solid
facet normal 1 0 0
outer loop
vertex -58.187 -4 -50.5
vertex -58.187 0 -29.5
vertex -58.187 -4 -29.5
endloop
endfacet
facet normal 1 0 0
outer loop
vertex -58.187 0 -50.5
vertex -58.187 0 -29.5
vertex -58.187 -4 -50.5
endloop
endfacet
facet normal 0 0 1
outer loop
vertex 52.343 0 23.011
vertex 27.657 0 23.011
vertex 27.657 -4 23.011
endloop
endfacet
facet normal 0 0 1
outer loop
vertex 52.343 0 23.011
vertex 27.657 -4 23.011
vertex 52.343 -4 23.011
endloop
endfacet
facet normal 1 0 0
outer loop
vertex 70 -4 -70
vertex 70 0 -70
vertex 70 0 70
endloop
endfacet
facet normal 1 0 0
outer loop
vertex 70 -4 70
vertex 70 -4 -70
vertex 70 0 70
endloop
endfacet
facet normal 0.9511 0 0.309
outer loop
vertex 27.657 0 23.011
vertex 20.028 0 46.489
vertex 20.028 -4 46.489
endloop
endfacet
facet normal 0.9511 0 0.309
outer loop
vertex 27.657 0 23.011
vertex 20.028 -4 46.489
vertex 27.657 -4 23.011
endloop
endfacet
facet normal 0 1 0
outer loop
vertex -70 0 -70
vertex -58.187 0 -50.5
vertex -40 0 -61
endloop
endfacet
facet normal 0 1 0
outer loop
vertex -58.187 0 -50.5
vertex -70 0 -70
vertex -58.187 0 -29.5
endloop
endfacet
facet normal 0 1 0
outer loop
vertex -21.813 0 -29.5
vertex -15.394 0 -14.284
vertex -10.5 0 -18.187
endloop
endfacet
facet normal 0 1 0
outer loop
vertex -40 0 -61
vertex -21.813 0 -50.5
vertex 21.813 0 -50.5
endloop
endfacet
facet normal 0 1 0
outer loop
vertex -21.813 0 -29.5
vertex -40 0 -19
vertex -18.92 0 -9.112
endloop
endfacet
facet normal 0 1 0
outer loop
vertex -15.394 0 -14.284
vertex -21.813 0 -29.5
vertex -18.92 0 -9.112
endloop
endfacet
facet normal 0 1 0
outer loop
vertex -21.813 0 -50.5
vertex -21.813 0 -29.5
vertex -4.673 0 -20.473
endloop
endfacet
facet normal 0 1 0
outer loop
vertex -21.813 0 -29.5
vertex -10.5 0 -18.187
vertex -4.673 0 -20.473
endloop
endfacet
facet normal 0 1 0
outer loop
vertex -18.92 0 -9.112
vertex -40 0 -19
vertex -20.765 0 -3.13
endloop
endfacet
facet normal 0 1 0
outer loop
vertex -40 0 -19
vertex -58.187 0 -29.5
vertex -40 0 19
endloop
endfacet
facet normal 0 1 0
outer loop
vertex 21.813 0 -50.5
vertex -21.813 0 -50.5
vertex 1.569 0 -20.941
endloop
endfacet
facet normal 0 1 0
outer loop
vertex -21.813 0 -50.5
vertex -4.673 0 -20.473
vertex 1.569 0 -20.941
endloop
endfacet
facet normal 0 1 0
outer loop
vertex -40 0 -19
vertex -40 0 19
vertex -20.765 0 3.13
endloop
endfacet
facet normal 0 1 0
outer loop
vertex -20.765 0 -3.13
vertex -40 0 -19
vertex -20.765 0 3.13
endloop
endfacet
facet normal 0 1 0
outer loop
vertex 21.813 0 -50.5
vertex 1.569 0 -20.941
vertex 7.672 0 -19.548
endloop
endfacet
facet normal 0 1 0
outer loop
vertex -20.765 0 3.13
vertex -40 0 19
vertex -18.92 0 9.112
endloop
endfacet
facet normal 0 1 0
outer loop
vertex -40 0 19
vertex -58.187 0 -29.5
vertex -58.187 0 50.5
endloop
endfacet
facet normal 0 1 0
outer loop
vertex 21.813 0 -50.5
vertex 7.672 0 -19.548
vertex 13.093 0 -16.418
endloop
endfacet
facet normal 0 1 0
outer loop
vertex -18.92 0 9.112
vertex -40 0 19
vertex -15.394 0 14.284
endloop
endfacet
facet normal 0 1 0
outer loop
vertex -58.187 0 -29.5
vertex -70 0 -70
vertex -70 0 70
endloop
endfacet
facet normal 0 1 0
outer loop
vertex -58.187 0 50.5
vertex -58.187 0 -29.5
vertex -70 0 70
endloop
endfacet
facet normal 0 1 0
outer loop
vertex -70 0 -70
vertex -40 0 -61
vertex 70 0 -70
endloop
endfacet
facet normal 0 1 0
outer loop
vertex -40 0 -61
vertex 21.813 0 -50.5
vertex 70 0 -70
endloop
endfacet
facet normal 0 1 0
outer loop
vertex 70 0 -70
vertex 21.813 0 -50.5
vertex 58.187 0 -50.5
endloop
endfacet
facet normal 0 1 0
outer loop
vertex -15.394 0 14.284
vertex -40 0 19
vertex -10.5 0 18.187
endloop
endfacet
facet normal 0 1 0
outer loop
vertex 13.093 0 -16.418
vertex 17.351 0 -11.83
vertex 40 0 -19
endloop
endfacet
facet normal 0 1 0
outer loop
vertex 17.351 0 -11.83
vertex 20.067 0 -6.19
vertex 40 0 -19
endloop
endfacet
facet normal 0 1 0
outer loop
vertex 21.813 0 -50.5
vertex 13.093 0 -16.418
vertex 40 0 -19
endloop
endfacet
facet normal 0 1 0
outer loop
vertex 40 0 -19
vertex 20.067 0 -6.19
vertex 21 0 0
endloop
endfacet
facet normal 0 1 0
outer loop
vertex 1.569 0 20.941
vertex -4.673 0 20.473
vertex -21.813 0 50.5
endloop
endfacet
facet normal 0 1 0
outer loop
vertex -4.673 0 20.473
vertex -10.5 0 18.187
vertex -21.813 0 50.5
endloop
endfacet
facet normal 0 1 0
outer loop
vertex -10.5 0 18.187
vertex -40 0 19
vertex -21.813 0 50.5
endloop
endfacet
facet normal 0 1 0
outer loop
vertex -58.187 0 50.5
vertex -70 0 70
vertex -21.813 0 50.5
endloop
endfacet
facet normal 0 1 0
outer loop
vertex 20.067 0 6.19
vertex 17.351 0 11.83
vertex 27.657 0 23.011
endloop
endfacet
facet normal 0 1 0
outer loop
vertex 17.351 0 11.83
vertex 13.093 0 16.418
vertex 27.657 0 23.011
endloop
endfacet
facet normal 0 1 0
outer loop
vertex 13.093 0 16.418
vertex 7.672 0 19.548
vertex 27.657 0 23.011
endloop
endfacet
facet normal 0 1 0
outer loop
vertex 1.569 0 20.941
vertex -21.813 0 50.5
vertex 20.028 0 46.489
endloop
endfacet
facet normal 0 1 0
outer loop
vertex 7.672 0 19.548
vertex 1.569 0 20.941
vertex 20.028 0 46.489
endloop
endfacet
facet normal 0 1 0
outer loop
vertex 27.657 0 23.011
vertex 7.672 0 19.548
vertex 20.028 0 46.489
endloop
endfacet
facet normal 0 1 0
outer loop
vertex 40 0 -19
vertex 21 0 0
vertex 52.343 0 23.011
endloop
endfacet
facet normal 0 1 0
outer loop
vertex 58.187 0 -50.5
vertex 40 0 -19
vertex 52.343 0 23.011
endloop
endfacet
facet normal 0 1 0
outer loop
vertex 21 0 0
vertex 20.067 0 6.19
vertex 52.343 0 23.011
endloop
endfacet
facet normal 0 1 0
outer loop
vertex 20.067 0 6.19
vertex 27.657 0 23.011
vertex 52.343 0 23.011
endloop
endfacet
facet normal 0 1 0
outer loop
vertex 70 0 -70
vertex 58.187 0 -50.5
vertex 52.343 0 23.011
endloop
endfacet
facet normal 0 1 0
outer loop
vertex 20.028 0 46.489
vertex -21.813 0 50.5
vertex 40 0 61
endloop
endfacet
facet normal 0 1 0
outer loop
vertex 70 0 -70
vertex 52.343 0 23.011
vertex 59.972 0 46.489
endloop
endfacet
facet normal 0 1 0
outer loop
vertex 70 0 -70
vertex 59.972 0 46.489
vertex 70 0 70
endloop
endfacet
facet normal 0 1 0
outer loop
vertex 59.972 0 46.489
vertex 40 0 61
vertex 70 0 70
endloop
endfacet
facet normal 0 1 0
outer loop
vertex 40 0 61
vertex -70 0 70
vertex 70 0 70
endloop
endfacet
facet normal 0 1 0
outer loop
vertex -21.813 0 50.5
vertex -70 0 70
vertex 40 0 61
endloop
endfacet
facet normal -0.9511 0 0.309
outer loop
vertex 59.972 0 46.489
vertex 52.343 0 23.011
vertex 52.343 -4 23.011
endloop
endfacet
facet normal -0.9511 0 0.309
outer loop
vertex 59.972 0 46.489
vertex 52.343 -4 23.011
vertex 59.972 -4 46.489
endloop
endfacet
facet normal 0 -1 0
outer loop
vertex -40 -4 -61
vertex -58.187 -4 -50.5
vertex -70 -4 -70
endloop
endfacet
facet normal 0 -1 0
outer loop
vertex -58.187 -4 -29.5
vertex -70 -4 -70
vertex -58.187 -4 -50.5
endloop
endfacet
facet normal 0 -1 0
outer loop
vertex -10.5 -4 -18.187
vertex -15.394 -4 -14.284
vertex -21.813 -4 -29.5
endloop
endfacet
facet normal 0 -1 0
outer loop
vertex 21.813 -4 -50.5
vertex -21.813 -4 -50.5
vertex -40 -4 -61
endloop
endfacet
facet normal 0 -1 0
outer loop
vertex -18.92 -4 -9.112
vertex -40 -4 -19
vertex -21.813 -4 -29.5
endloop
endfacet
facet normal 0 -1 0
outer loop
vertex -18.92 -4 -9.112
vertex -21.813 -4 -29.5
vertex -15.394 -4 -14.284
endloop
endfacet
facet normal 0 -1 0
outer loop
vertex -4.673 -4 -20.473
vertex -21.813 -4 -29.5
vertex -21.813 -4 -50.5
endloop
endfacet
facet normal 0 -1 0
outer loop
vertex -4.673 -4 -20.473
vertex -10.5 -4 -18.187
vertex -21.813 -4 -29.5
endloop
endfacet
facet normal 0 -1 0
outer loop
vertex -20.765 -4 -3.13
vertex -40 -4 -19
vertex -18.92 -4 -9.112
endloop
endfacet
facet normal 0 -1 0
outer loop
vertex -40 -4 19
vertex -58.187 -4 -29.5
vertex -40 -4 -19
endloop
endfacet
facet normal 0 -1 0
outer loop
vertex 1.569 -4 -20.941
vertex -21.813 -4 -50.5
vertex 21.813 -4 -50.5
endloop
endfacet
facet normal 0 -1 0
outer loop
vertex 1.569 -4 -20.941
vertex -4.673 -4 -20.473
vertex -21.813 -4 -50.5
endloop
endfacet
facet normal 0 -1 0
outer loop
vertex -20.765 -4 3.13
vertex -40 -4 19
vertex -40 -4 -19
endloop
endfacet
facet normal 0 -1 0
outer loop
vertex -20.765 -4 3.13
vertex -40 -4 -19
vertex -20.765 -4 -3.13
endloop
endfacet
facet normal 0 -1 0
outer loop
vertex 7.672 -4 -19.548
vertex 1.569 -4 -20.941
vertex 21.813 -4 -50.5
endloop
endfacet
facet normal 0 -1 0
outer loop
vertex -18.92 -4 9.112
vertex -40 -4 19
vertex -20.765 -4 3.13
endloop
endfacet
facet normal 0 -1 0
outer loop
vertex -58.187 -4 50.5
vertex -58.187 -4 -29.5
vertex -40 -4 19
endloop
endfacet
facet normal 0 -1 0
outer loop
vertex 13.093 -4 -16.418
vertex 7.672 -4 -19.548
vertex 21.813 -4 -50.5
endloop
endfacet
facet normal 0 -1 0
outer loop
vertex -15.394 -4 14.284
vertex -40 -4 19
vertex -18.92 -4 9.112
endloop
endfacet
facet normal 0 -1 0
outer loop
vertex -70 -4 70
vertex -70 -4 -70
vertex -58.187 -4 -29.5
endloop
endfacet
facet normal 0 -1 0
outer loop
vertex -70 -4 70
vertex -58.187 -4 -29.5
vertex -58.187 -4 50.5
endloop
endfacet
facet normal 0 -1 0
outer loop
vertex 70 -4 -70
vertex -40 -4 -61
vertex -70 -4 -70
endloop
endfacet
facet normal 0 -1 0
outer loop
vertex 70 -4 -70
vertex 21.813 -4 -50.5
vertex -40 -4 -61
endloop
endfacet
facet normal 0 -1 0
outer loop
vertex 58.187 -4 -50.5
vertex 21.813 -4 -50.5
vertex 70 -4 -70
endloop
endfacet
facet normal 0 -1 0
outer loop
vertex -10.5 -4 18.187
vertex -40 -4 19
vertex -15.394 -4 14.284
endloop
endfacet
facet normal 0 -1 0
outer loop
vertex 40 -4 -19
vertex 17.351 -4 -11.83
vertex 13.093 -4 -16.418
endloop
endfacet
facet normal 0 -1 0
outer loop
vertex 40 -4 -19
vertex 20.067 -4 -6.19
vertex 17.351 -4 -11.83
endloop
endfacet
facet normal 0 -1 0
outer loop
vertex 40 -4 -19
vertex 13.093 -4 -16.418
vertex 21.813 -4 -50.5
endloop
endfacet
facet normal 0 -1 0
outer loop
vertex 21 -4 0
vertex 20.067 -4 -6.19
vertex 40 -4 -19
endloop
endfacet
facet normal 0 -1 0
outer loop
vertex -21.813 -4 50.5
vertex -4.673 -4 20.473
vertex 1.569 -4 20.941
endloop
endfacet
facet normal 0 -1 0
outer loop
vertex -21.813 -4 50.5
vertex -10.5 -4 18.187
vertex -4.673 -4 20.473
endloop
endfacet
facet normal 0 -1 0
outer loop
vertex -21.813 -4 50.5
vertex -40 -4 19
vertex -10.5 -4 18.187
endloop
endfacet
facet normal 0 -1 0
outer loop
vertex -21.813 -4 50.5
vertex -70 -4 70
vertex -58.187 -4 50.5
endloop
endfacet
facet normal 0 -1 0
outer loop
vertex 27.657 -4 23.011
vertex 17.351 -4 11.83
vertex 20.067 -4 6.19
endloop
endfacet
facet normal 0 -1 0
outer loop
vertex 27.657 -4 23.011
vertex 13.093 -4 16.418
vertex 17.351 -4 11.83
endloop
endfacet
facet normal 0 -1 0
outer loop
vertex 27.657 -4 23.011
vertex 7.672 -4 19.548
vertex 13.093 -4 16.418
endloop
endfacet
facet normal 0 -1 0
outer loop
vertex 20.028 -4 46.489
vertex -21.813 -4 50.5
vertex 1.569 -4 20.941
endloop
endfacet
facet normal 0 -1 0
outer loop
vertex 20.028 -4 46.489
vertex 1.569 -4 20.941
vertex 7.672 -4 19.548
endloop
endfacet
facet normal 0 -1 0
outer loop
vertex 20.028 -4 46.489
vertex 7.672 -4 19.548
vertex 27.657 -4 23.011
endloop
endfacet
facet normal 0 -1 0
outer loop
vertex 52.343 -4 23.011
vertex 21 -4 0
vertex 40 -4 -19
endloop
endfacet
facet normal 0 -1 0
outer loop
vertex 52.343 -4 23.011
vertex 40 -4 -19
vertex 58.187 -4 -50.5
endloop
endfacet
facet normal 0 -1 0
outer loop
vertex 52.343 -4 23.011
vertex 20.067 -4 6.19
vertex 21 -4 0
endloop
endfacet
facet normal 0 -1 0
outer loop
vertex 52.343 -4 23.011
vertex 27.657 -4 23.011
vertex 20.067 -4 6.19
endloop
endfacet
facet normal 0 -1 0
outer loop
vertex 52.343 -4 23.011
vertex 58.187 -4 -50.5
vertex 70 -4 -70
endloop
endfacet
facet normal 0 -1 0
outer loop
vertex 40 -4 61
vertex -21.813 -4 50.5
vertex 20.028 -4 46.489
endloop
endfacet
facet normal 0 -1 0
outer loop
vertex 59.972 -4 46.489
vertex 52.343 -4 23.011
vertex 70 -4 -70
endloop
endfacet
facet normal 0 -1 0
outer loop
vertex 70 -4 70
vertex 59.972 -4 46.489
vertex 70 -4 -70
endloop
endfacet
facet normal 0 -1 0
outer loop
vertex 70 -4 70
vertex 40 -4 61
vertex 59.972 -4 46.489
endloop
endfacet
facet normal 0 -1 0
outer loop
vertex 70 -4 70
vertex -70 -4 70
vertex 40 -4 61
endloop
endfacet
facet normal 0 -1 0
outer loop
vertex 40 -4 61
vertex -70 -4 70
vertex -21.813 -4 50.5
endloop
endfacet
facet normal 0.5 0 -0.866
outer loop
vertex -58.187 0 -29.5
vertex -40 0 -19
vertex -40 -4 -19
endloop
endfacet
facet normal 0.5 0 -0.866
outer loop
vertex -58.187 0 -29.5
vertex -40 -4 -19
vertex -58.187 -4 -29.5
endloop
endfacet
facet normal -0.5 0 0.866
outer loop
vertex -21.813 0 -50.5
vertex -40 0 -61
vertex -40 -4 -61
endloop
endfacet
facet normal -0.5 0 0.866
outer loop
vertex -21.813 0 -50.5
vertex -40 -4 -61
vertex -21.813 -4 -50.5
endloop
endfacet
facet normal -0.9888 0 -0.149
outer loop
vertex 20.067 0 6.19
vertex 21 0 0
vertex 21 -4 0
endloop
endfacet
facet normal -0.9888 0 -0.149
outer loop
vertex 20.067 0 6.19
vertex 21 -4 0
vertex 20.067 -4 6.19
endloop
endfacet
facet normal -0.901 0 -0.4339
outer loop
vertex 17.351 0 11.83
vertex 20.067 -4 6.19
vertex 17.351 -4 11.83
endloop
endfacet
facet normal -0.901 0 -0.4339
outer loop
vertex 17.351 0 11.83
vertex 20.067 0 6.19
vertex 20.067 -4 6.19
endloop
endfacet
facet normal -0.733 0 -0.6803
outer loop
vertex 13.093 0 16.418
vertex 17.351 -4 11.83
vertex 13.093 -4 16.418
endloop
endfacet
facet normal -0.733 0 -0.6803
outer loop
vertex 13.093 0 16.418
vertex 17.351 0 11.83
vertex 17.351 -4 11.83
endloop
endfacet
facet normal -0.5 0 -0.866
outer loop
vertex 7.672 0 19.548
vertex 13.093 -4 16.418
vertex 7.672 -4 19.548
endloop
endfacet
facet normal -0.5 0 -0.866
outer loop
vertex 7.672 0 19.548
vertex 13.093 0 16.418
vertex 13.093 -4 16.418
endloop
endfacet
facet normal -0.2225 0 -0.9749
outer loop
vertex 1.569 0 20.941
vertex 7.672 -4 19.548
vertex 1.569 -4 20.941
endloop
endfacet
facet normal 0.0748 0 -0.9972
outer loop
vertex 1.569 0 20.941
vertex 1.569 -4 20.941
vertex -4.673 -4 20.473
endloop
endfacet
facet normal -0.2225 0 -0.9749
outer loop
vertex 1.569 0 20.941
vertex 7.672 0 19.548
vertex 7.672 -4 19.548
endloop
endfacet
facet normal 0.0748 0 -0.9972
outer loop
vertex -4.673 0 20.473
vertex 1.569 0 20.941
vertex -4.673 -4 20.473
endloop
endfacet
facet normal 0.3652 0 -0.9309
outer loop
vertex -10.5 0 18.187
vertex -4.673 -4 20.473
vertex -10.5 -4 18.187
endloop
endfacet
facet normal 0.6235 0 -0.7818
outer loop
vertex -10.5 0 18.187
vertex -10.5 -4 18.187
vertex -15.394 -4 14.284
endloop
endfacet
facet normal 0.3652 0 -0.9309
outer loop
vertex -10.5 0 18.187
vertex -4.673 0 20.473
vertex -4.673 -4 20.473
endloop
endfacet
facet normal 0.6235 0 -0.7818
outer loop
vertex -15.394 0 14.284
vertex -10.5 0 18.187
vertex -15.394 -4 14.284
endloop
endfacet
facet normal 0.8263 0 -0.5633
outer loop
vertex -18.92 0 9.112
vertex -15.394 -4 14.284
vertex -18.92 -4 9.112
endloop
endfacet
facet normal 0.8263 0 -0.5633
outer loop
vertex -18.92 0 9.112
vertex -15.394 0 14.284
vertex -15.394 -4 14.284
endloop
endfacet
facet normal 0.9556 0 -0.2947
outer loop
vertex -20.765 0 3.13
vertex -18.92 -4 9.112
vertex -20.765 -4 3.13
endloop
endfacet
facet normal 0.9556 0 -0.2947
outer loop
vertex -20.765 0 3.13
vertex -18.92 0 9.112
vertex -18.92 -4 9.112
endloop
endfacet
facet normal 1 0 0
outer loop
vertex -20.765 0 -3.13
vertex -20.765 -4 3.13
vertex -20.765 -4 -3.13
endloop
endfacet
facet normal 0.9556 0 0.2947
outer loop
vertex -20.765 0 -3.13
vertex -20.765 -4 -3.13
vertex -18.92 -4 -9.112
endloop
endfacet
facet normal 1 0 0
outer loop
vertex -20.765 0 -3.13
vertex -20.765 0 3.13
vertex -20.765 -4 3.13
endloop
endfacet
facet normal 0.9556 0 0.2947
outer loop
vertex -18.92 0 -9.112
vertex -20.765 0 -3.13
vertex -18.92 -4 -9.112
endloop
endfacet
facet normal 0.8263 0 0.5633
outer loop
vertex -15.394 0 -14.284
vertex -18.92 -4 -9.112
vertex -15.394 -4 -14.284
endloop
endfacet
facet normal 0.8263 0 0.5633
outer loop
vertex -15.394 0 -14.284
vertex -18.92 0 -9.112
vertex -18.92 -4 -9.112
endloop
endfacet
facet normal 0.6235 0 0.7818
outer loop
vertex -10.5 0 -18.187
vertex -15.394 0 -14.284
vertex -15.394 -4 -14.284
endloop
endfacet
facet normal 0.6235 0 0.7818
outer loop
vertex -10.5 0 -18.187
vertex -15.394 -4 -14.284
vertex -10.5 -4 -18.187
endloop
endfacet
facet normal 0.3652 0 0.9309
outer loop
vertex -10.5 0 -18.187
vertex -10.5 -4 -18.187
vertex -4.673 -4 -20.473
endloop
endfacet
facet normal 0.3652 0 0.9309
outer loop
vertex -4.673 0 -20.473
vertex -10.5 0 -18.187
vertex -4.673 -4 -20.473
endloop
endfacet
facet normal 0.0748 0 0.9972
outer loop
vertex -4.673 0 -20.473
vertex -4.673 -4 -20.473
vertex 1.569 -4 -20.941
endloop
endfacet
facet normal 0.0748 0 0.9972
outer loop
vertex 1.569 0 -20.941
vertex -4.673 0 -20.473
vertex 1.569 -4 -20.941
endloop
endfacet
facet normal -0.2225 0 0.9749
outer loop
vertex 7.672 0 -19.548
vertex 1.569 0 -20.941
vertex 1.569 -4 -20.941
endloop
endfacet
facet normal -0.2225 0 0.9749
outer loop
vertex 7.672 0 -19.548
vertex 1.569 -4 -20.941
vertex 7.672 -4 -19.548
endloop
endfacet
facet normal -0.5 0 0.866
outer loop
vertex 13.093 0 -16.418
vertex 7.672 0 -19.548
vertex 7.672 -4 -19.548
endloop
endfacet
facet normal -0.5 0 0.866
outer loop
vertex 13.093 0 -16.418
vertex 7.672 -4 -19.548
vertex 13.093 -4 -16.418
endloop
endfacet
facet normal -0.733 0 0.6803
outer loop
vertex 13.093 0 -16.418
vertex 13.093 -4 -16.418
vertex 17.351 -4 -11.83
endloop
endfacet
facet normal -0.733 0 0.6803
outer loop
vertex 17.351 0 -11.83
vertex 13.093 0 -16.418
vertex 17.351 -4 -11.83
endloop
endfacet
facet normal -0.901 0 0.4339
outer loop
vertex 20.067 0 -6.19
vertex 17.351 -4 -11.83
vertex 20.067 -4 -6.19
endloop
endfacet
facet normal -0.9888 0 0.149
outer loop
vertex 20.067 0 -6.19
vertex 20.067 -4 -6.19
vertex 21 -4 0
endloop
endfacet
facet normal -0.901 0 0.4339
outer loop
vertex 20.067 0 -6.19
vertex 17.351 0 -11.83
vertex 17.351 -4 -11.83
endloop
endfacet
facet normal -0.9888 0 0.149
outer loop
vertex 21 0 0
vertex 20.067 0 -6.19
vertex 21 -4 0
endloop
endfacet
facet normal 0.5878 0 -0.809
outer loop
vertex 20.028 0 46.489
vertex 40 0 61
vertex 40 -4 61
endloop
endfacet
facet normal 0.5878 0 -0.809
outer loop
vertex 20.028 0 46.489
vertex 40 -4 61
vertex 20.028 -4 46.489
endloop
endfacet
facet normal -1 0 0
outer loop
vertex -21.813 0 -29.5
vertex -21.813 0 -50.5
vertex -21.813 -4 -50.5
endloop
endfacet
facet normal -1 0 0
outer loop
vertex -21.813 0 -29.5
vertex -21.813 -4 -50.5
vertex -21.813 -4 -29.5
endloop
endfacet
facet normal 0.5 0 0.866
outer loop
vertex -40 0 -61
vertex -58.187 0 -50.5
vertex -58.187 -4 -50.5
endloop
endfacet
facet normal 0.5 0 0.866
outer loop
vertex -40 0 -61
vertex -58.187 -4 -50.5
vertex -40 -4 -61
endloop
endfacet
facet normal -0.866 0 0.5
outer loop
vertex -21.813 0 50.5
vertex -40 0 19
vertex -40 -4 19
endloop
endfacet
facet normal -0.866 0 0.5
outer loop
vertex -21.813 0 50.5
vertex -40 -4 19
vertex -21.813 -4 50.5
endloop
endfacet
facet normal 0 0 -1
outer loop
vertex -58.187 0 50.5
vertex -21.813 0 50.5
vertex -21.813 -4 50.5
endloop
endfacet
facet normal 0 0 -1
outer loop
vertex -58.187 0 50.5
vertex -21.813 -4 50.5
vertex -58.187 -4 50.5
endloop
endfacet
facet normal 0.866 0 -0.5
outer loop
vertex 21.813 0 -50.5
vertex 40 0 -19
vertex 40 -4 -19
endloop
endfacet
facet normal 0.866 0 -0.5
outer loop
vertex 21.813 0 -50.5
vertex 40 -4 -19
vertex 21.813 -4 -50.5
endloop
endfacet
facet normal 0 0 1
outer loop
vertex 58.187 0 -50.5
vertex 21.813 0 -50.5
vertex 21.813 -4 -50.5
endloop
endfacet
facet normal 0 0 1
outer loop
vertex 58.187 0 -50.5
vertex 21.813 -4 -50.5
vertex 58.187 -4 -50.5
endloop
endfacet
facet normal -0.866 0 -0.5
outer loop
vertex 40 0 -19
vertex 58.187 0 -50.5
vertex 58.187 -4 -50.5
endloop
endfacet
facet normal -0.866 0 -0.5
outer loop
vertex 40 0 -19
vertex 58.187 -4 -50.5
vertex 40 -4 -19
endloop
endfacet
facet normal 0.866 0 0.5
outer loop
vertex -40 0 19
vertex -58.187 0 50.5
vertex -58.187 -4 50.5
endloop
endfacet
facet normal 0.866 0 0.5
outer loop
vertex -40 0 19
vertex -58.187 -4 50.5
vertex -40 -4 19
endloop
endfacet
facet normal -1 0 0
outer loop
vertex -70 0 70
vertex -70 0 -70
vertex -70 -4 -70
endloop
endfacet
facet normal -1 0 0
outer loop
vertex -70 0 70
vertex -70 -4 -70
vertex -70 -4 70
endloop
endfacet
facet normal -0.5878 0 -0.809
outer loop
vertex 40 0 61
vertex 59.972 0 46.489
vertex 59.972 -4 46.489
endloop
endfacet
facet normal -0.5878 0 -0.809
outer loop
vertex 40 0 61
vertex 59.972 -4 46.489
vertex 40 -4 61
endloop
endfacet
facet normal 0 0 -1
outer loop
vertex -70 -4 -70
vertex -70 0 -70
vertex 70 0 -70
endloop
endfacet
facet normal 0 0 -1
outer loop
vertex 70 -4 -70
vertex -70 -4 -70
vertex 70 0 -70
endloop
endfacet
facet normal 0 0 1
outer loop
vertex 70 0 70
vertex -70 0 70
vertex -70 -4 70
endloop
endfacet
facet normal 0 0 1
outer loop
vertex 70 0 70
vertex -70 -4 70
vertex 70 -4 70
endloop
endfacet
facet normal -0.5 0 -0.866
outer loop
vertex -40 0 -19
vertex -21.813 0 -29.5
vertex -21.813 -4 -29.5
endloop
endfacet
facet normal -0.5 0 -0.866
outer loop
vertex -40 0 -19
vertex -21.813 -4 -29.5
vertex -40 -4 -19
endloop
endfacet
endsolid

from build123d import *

# Parameters (mm, degrees)
SKETCH_W  = 140
SKETCH_H  = 140
SKETCH_R  = 21
PAD_DEPTH = 4


with BuildPart() as part:
    # Sketch → Pad (new body)
    with BuildSketch(Plane.XZ):
        Rectangle(SKETCH_W, SKETCH_H)
        Circle(SKETCH_R, mode=Mode.SUBTRACT)
        Polygon((-40, 19), (-21.813467, 50.5), (-58.186533, 50.5), align=None, mode=Mode.SUBTRACT)
        Polygon((40, -19), (21.813467, -50.5), (58.186533, -50.5), align=None, mode=Mode.SUBTRACT)
        Polygon((27.65651, 23.010643), (52.34349, 23.010643), (59.972187, 46.489357), (40, 61), (20.027813, 46.489357), align=None, mode=Mode.SUBTRACT)
        Polygon((-21.813467, -29.5), (-40, -19), (-58.186533, -29.5), (-58.186533, -50.5), (-40, -61), (-21.813467, -50.5), align=None, mode=Mode.SUBTRACT)
    extrude(amount=PAD_DEPTH)


solid = part.part
